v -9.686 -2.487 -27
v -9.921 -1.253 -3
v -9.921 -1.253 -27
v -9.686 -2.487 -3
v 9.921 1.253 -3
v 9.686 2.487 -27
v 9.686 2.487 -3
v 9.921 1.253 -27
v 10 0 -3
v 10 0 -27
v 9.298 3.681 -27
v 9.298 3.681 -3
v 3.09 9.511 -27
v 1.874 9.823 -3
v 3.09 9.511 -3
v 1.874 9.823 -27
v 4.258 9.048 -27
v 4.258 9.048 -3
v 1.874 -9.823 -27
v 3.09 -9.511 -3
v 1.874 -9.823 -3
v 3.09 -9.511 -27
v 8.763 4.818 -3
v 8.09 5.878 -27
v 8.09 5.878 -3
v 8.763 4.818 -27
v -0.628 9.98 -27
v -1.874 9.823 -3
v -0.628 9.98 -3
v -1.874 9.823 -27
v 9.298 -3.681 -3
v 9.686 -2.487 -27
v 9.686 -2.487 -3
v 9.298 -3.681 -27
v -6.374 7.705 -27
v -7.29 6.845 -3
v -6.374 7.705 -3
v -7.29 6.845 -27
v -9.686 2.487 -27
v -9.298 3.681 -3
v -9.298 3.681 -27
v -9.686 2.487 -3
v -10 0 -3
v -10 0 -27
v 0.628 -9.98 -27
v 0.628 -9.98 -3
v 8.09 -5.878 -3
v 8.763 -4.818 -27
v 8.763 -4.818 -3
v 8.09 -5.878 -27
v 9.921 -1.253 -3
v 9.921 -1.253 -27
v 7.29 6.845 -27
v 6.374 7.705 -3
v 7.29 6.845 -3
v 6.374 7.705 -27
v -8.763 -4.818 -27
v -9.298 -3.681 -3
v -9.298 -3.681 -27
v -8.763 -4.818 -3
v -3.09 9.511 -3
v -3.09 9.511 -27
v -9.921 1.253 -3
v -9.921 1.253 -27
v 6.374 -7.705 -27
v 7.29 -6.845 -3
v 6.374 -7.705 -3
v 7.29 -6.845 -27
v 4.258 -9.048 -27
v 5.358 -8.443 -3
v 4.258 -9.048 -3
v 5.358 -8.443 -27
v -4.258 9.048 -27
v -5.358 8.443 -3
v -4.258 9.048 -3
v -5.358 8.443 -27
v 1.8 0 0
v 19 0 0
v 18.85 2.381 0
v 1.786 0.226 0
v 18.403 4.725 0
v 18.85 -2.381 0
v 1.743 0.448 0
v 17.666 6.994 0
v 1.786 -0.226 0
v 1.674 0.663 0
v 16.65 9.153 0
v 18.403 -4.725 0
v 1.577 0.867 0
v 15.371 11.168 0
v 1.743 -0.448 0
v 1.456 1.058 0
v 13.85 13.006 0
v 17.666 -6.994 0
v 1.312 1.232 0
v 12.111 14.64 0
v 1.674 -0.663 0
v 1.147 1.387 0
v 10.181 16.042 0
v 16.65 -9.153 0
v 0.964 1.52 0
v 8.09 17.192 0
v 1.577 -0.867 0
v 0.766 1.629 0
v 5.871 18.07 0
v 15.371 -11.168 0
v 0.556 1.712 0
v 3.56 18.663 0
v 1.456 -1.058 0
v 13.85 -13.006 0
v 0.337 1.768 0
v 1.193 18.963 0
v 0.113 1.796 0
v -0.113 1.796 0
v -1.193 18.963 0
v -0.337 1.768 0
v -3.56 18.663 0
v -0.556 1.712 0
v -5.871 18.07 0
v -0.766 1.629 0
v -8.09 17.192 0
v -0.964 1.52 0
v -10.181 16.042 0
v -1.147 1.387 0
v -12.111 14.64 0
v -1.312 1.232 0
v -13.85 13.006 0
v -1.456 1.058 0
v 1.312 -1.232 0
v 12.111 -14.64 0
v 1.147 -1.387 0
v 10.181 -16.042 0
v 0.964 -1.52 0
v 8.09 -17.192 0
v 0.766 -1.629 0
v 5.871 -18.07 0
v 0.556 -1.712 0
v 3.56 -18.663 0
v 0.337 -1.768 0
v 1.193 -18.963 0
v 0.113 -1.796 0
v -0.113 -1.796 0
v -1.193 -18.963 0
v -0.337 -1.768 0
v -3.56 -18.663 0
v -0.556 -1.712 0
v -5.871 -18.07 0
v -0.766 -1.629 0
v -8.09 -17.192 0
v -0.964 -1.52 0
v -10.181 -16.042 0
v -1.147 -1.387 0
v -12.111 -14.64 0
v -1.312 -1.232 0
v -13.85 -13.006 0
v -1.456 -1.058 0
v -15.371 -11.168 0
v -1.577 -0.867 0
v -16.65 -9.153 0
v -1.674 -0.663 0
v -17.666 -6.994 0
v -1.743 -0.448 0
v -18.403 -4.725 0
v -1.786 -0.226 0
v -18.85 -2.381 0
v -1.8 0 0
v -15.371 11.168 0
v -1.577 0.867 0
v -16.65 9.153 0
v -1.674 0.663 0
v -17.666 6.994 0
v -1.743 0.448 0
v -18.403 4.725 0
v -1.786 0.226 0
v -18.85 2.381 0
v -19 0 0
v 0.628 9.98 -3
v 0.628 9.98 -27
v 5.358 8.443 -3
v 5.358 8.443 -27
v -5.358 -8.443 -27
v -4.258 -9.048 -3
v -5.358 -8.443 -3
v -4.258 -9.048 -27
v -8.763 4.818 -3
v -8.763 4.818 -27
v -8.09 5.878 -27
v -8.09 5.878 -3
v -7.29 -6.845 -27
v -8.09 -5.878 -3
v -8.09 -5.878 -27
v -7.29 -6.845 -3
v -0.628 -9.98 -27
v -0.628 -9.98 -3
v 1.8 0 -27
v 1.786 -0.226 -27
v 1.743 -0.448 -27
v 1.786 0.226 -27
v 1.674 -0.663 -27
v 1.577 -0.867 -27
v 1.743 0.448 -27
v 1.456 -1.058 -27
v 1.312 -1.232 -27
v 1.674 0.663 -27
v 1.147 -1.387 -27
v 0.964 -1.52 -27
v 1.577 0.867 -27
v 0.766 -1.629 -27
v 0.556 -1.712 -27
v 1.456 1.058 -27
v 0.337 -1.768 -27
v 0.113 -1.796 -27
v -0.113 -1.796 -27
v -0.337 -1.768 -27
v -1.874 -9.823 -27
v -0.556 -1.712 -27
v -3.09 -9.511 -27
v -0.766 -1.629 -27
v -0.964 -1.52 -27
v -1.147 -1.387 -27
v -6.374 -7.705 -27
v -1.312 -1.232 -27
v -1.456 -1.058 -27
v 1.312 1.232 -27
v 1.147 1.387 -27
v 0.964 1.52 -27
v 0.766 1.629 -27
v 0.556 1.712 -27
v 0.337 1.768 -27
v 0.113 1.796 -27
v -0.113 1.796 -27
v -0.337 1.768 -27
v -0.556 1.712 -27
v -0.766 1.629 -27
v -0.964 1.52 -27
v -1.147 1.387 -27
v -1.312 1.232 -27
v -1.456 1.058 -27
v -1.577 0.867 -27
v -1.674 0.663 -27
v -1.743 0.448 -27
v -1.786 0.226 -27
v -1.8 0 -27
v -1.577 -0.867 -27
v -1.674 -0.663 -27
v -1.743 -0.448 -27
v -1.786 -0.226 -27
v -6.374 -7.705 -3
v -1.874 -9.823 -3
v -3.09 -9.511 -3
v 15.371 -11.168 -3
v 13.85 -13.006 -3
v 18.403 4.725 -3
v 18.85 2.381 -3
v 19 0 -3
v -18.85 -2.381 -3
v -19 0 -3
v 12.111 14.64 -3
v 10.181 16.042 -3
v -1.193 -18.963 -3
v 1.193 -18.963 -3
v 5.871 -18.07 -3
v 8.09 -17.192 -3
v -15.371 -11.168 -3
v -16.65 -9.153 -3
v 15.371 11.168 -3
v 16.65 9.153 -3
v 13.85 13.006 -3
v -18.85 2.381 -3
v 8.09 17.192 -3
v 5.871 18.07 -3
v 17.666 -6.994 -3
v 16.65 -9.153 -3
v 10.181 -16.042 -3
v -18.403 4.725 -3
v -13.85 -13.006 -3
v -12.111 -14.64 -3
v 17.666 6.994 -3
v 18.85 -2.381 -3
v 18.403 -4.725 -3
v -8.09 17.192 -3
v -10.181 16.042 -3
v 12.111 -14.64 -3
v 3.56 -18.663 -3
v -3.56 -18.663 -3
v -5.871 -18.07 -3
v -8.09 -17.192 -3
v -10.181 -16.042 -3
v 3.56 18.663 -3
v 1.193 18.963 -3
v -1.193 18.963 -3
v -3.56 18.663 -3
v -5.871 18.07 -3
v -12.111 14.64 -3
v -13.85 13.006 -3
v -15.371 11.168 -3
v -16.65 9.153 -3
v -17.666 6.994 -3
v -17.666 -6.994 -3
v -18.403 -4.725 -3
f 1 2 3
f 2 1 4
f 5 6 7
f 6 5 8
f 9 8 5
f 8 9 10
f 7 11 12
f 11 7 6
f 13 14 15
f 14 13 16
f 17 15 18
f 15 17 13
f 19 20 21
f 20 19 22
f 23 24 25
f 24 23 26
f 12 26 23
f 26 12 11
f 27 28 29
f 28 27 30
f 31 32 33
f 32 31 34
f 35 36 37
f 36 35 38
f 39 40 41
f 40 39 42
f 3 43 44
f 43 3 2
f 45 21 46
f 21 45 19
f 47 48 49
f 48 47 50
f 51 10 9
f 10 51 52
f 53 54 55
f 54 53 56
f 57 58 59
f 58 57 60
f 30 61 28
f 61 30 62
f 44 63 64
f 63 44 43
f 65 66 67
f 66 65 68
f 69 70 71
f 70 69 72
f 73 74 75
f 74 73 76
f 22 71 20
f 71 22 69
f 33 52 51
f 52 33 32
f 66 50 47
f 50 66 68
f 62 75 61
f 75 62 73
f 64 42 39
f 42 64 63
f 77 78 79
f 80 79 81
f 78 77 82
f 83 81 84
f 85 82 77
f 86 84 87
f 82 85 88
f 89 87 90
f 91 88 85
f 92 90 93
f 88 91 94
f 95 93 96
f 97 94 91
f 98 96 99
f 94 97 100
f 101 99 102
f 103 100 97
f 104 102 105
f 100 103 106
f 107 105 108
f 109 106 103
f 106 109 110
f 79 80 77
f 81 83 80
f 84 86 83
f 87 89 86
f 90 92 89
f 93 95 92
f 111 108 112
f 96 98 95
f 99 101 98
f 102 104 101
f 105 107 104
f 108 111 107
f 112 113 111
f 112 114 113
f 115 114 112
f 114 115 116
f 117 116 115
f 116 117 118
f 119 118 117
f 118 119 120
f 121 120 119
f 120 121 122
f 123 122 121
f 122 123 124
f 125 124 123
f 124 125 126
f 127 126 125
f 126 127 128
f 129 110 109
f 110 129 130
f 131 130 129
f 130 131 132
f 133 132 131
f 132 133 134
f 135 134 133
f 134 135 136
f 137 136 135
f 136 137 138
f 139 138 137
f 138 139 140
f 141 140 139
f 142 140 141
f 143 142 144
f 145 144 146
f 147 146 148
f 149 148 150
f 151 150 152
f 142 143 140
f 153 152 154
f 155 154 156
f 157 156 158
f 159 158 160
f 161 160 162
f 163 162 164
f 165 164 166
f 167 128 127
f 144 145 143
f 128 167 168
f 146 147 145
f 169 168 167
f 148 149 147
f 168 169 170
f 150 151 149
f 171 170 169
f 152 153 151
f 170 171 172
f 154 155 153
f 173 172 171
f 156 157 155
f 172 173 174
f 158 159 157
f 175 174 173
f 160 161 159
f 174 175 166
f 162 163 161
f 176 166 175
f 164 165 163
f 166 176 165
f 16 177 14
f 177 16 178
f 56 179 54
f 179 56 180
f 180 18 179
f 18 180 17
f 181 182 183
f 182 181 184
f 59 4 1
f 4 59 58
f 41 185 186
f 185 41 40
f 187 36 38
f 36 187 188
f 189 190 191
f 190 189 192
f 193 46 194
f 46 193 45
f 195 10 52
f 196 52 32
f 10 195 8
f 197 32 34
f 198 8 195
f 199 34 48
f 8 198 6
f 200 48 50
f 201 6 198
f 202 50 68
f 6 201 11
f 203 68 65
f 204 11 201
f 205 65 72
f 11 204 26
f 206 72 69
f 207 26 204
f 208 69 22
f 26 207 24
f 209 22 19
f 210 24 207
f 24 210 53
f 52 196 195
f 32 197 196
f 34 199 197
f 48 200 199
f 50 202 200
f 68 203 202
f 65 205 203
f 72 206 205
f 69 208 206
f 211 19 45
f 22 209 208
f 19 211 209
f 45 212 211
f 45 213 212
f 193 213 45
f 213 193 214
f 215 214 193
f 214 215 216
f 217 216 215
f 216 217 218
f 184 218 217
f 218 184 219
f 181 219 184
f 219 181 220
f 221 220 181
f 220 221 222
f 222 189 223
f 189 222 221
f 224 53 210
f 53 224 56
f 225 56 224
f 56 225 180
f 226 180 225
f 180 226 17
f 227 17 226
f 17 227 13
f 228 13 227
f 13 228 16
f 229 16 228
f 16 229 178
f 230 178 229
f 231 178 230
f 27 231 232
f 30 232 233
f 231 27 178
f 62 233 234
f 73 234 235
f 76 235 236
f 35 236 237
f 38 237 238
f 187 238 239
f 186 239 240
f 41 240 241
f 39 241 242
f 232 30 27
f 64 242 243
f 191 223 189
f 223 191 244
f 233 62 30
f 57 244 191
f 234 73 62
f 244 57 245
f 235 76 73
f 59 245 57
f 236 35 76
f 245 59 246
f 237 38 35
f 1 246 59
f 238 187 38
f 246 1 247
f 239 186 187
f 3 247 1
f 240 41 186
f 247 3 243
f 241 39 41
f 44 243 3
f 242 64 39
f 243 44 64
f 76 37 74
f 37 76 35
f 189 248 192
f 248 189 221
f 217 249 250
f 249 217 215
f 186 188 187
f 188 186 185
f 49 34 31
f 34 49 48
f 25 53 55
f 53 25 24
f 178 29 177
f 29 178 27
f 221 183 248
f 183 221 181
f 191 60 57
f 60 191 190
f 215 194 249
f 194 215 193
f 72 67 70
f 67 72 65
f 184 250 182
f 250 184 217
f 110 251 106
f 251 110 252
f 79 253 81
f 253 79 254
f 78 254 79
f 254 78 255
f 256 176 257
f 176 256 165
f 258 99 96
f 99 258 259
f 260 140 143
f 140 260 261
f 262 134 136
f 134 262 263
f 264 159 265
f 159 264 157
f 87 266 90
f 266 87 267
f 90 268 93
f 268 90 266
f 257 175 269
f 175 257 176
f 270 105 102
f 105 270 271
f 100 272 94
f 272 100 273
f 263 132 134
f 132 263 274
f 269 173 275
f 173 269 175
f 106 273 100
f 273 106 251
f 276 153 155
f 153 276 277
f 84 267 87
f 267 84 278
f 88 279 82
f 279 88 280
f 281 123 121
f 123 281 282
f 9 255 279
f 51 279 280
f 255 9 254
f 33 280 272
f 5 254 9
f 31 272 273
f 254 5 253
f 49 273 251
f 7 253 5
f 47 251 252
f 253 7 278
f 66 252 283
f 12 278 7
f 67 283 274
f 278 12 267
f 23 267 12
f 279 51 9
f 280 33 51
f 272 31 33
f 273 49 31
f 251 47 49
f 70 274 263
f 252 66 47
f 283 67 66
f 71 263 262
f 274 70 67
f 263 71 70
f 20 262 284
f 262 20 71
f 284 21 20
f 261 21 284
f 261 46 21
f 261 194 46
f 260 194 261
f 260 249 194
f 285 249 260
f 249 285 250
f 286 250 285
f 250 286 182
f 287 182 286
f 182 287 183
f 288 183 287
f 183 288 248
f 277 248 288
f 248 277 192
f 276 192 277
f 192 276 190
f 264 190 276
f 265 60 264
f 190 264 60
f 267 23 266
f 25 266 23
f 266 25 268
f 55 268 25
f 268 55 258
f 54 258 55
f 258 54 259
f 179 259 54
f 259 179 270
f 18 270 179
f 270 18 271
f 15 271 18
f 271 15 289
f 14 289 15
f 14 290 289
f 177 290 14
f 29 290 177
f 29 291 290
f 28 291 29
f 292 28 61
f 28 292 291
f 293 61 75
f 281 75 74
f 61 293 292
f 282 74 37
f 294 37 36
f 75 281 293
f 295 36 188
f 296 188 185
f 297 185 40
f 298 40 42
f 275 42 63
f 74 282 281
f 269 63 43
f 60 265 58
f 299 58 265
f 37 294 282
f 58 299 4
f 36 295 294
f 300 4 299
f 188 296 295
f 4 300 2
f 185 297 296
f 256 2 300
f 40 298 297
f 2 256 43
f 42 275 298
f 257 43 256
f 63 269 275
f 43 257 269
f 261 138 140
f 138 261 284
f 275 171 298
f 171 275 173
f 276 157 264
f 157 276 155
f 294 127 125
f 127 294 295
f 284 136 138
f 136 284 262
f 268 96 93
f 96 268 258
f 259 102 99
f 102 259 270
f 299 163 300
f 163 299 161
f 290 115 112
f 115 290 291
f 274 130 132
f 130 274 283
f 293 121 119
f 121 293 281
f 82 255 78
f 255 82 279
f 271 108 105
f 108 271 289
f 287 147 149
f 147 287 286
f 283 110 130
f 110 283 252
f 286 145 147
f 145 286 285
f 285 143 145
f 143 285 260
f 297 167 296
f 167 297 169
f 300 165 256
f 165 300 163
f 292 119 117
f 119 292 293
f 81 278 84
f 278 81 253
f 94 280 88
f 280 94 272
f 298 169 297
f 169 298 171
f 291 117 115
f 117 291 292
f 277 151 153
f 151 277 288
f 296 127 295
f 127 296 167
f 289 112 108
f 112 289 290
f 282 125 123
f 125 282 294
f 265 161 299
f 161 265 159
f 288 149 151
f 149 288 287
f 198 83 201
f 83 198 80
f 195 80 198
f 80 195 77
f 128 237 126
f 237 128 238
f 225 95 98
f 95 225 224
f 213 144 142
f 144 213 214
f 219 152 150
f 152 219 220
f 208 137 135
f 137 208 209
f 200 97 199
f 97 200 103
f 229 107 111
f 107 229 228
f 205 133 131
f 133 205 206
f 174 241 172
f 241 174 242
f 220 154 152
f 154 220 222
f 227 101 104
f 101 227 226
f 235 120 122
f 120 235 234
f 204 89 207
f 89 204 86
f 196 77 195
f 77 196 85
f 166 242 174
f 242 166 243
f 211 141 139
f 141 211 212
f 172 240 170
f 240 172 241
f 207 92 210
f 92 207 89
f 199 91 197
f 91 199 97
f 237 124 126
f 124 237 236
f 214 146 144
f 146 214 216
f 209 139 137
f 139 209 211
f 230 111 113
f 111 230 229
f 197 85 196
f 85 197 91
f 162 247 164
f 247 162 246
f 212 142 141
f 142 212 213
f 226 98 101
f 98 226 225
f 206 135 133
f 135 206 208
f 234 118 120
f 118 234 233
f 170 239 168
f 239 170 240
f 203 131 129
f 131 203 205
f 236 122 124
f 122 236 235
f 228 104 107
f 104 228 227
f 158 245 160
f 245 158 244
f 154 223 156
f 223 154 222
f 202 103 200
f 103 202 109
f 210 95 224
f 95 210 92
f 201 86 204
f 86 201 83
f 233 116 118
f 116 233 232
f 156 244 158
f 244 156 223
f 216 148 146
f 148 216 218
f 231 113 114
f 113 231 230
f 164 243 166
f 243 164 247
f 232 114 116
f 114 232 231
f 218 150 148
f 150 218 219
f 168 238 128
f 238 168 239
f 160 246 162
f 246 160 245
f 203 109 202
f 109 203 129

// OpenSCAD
$fn = 50;


difference() {
	union() {
		translate(v = [0, 0, -27.0000000000]) {
			cylinder(h = 27, r = 10.0000000000);
		}
		translate(v = [0, 0, -3.0000000000]) {
			cylinder(h = 3, r = 19.0000000000);
		}
	}
	union() {
		#translate(v = [0, 0, -27]) {
			cylinder(h = 27, r = 1.8000000000);
		}
	}
}
